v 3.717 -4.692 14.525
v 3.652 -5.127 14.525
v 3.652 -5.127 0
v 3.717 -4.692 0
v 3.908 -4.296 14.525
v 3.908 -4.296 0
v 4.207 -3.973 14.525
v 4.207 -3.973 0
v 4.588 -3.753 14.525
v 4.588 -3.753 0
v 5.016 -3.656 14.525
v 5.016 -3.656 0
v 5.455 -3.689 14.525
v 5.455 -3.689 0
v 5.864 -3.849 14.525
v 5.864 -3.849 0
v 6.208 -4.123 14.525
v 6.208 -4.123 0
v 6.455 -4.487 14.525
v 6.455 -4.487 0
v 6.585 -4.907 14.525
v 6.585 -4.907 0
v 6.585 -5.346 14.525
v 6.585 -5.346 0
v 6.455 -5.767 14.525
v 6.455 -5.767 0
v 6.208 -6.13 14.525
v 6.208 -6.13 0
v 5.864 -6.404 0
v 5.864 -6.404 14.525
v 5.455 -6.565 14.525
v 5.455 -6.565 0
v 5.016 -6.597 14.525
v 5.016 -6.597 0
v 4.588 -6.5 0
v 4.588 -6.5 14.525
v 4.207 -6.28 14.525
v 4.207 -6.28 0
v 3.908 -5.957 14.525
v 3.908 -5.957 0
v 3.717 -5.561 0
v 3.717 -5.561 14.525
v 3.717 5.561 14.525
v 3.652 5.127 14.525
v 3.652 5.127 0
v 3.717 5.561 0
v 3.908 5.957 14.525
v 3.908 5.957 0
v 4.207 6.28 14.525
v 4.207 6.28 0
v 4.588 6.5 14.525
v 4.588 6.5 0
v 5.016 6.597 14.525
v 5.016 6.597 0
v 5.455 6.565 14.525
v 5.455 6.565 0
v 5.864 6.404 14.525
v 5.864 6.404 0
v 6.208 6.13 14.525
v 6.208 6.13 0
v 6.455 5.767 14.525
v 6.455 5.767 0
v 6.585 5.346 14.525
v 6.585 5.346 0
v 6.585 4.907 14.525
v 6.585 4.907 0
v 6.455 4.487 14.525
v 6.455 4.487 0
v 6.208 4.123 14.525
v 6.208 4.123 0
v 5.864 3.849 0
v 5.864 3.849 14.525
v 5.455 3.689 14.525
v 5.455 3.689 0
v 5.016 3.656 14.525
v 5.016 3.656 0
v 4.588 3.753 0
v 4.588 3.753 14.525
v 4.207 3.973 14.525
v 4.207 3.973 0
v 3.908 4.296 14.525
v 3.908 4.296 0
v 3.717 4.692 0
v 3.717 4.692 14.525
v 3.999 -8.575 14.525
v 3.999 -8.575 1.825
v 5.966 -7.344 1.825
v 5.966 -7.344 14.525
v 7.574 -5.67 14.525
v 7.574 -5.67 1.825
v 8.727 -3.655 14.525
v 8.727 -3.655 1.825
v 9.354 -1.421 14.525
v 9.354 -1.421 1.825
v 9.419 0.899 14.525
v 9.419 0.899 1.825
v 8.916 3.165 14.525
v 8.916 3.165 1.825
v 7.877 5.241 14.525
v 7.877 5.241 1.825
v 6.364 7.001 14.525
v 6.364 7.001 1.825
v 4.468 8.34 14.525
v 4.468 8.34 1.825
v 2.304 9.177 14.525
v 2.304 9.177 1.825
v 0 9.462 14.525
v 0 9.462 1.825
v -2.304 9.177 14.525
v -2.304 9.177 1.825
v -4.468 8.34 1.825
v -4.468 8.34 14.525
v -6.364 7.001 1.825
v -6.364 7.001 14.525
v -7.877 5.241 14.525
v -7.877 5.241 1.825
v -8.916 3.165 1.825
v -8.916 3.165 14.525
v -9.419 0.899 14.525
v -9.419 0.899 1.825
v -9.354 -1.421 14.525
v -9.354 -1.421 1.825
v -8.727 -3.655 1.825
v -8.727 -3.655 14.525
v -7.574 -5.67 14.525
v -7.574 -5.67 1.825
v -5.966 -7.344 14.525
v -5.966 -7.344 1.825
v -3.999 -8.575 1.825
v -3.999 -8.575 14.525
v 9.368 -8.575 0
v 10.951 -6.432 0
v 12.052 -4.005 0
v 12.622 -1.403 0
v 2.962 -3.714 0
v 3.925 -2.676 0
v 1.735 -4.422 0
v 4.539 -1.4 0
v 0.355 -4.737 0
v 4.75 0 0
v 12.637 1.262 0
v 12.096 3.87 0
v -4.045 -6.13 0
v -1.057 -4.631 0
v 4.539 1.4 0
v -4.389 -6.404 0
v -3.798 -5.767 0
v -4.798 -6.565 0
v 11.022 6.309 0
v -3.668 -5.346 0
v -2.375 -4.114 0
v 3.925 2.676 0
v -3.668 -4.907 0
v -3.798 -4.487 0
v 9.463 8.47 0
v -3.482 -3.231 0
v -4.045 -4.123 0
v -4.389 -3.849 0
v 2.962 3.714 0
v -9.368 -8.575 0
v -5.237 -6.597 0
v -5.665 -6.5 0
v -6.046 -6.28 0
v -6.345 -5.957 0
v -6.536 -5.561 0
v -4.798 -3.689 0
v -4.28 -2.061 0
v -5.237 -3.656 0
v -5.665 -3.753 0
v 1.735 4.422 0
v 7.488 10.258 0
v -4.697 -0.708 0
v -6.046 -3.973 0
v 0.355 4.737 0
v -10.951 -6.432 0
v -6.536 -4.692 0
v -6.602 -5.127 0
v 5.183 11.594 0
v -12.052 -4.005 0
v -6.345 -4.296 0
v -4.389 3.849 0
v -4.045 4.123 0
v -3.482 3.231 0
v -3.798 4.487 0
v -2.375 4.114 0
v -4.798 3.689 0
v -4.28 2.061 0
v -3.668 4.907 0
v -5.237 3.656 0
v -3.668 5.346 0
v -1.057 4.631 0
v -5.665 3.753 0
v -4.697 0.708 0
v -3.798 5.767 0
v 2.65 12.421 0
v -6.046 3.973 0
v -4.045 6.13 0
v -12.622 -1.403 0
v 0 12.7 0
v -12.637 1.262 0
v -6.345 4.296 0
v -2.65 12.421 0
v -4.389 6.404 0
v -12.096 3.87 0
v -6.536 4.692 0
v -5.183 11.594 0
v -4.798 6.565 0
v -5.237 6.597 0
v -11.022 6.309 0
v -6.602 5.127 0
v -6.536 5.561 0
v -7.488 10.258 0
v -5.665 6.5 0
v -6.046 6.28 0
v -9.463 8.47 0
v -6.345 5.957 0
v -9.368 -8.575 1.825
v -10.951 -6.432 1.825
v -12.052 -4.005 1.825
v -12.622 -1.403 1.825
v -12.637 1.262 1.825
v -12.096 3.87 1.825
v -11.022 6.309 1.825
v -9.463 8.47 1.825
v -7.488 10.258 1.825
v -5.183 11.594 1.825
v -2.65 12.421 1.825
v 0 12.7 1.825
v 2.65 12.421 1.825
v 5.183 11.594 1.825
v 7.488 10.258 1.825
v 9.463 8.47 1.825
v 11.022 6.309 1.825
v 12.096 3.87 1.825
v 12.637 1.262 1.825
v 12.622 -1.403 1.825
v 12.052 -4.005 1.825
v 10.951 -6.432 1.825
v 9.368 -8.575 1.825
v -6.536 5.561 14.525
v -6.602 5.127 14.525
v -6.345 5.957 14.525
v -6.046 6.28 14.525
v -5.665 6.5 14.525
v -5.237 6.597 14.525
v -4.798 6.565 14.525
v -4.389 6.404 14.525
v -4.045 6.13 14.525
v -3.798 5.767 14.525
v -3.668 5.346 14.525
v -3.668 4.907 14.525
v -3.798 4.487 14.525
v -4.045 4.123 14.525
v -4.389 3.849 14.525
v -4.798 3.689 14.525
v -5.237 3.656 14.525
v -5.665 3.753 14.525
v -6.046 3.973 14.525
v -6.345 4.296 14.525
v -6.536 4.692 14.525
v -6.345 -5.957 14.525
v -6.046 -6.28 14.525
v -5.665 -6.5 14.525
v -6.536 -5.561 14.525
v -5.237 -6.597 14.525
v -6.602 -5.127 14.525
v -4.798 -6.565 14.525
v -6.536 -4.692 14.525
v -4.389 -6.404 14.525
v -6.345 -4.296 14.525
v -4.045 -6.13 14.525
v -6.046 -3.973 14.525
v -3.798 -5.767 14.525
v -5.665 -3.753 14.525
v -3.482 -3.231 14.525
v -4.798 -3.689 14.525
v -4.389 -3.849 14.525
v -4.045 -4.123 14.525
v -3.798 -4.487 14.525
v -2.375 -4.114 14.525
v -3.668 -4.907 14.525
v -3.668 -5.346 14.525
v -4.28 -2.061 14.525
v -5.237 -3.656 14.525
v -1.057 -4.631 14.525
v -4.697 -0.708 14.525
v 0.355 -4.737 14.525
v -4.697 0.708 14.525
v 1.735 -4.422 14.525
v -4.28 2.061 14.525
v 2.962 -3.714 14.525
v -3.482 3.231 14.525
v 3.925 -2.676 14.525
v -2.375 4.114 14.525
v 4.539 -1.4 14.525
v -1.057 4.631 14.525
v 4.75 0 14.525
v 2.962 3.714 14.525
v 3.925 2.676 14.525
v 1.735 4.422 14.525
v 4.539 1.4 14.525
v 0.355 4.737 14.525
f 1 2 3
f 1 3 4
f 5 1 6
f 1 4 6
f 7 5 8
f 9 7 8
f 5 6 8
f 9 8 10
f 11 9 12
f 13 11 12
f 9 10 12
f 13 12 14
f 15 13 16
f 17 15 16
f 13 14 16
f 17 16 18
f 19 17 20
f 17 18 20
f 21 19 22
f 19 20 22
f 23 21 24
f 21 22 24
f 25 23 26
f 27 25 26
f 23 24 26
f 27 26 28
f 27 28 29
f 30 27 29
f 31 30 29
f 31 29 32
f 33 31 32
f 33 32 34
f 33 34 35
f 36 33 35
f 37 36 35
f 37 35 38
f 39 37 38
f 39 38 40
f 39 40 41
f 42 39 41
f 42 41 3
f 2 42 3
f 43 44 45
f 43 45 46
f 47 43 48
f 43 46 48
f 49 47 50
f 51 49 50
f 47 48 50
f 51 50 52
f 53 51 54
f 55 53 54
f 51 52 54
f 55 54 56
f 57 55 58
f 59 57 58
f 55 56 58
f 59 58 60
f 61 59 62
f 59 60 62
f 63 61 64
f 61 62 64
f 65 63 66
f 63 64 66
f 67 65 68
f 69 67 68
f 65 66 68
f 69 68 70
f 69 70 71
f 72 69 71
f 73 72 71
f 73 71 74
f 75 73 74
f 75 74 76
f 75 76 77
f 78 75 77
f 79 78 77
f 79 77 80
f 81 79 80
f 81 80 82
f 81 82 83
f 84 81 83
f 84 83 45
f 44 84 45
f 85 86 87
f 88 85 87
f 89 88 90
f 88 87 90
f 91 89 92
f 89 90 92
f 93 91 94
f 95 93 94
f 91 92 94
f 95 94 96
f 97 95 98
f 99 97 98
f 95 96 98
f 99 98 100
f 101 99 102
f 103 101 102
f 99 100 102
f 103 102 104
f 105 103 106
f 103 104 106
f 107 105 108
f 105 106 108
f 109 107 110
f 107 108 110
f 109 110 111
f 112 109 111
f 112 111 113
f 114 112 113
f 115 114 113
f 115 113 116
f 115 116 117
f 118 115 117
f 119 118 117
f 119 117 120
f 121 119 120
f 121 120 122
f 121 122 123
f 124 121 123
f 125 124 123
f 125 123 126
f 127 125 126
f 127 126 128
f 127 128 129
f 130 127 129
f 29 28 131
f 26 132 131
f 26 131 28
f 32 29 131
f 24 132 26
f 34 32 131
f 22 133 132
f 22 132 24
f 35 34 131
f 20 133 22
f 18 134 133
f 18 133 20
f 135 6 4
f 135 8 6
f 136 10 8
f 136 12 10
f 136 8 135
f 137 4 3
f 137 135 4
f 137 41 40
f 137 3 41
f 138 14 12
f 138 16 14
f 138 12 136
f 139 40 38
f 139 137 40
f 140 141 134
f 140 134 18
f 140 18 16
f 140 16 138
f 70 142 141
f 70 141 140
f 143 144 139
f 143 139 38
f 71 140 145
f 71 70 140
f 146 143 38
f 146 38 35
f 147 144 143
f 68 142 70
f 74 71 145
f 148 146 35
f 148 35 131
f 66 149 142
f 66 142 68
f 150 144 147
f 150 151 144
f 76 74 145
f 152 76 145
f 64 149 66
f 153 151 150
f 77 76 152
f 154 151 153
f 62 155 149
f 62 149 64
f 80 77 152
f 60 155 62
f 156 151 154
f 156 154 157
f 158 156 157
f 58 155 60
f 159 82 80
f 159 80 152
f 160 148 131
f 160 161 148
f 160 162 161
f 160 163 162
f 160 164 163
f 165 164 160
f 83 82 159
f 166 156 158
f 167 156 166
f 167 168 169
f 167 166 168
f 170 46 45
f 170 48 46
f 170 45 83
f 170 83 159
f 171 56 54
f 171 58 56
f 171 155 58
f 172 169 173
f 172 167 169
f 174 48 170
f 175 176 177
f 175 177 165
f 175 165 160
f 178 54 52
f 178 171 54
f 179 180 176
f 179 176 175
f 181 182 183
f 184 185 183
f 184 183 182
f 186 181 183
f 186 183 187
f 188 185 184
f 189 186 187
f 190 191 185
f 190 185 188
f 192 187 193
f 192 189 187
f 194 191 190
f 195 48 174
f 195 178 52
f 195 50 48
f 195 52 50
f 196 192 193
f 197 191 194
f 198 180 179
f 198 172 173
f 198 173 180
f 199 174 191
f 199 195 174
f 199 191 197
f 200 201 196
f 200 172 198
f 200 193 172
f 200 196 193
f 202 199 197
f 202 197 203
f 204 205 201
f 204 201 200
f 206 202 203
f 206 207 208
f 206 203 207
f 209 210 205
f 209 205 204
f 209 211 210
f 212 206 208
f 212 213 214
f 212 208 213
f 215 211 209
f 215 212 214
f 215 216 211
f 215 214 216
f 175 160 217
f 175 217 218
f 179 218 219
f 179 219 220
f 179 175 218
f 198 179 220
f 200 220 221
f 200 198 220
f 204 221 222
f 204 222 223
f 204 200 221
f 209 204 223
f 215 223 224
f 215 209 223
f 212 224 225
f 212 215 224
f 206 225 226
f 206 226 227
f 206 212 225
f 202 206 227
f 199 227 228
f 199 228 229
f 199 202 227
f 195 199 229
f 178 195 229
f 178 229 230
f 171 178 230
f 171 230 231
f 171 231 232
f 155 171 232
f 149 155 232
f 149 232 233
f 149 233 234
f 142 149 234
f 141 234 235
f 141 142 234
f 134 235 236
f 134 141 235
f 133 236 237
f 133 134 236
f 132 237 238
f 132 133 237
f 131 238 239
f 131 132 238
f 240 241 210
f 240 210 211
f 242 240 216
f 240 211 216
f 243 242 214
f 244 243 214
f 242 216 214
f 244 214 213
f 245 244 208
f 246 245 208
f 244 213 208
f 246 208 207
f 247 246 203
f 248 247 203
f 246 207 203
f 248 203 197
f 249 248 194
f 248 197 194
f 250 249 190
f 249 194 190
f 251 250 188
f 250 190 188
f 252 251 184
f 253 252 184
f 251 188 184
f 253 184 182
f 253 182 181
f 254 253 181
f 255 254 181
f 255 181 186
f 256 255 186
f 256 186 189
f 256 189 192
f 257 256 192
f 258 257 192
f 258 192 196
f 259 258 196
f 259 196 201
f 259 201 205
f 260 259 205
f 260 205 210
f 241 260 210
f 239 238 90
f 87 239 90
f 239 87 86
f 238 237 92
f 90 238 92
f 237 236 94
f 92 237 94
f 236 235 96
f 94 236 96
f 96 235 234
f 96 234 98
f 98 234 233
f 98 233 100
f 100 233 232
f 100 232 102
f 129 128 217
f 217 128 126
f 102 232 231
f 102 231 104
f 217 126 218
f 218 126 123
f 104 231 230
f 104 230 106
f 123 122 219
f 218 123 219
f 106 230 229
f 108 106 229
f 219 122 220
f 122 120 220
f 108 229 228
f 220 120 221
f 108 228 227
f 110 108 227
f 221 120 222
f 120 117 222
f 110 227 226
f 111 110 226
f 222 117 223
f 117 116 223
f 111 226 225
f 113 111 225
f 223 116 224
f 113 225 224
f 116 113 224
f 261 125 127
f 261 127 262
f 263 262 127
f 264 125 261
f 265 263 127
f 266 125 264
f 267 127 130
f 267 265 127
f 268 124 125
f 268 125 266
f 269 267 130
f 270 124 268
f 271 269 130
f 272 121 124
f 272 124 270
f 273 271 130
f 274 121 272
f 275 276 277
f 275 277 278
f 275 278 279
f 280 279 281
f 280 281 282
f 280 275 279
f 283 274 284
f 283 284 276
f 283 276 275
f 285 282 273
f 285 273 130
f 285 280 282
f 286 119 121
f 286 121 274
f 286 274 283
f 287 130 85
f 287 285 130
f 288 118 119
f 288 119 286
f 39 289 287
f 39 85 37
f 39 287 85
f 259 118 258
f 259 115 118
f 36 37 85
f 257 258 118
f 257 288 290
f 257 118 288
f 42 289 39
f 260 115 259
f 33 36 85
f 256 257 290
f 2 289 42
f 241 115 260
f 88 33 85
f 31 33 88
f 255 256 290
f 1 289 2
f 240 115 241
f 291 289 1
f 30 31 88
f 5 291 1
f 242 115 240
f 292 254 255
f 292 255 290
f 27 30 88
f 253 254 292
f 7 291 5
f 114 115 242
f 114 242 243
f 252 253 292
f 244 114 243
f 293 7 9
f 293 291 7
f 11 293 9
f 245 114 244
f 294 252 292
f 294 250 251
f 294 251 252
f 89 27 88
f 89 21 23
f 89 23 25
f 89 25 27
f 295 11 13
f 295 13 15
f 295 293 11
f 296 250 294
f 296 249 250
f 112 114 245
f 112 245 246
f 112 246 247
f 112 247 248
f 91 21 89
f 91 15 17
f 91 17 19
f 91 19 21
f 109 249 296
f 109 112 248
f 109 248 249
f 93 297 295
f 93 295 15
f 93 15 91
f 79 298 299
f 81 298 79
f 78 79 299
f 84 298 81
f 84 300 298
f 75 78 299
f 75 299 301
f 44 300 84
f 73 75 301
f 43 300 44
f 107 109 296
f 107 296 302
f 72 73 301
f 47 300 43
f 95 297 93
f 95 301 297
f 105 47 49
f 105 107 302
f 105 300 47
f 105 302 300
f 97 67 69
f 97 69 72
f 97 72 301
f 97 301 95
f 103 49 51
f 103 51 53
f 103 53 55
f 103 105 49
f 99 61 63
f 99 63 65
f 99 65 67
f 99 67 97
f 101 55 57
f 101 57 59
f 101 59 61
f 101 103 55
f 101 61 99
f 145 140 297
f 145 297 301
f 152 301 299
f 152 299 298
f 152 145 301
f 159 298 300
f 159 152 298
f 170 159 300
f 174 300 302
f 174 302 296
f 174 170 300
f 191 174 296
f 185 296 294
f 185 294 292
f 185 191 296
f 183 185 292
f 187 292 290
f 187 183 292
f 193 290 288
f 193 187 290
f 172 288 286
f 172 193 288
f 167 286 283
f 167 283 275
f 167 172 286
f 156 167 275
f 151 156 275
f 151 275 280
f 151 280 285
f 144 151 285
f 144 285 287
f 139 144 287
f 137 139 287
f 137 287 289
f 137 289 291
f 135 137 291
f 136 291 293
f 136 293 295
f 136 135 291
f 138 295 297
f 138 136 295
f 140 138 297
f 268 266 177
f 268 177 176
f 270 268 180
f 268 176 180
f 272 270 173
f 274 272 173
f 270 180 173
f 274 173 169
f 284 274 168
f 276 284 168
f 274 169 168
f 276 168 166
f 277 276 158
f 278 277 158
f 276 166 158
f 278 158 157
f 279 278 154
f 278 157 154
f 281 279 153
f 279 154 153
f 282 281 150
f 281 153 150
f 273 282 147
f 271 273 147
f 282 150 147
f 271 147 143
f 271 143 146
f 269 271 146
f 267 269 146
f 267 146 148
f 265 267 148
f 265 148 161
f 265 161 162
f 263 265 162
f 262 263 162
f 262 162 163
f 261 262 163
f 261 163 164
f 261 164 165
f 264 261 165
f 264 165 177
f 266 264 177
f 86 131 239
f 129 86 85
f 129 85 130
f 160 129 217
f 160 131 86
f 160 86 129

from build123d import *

# Parameters (mm, degrees)
SKETCH1_R           = 4.750000025
BOSS_EXTRUDE1_DEPTH = 14.524999906
SKETCH3_R           = 1.474999971
CUT_EXTRUDE1_DEPTH  = 19.05
BOSS_EXTRUDE2_DEPTH = 1.825


with BuildPart() as part:
    # Sketch1 → Boss-Extrude1 (new body)
    with BuildSketch(Plane.XY):
        with BuildLine():
            Line((-3.998602683, -8.575031127), (3.998602683, -8.575031127))
            ThreePointArc((3.998602683, -8.575031127), (0, 9.4615), (-3.998602683, -8.575031127))
        make_face()
        Circle(SKETCH1_R, mode=Mode.SUBTRACT)
    extrude(amount=BOSS_EXTRUDE1_DEPTH)

    # Sketch3 → Cut-Extrude1 (cut)
    with BuildSketch(Plane(origin=(0, 0, 0), x_dir=(-1, 0, 0), z_dir=(0, 0, -1))):
        with Locations((5.126524148, -5.126524148)):
            Circle(SKETCH3_R)
        with Locations((-5.126524148, -5.126524148)):
            Circle(SKETCH3_R)
        with Locations((-5.126524148, 5.126524148)):
            Circle(SKETCH3_R)
        with Locations((5.126524148, 5.126524148)):
            Circle(SKETCH3_R)
    extrude(amount=-CUT_EXTRUDE1_DEPTH, mode=Mode.SUBTRACT)

    # Sketch4 → Boss-Extrude2 (add)
    with BuildSketch(Plane.XY):
        with BuildLine():
            Line((-3.998602683, -8.575031127), (-9.367968892, -8.575031127))
            ThreePointArc((-9.367968892, -8.575031127), (0, 12.7), (9.367968892, -8.575031127))
            Line((9.367968892, -8.575031127), (3.998602683, -8.575031127))
            ThreePointArc((3.998602683, -8.575031127), (0, 9.4615), (-3.998602683, -8.575031127))
        make_face()
    extrude(amount=BOSS_EXTRUDE2_DEPTH)


solid = part.part
